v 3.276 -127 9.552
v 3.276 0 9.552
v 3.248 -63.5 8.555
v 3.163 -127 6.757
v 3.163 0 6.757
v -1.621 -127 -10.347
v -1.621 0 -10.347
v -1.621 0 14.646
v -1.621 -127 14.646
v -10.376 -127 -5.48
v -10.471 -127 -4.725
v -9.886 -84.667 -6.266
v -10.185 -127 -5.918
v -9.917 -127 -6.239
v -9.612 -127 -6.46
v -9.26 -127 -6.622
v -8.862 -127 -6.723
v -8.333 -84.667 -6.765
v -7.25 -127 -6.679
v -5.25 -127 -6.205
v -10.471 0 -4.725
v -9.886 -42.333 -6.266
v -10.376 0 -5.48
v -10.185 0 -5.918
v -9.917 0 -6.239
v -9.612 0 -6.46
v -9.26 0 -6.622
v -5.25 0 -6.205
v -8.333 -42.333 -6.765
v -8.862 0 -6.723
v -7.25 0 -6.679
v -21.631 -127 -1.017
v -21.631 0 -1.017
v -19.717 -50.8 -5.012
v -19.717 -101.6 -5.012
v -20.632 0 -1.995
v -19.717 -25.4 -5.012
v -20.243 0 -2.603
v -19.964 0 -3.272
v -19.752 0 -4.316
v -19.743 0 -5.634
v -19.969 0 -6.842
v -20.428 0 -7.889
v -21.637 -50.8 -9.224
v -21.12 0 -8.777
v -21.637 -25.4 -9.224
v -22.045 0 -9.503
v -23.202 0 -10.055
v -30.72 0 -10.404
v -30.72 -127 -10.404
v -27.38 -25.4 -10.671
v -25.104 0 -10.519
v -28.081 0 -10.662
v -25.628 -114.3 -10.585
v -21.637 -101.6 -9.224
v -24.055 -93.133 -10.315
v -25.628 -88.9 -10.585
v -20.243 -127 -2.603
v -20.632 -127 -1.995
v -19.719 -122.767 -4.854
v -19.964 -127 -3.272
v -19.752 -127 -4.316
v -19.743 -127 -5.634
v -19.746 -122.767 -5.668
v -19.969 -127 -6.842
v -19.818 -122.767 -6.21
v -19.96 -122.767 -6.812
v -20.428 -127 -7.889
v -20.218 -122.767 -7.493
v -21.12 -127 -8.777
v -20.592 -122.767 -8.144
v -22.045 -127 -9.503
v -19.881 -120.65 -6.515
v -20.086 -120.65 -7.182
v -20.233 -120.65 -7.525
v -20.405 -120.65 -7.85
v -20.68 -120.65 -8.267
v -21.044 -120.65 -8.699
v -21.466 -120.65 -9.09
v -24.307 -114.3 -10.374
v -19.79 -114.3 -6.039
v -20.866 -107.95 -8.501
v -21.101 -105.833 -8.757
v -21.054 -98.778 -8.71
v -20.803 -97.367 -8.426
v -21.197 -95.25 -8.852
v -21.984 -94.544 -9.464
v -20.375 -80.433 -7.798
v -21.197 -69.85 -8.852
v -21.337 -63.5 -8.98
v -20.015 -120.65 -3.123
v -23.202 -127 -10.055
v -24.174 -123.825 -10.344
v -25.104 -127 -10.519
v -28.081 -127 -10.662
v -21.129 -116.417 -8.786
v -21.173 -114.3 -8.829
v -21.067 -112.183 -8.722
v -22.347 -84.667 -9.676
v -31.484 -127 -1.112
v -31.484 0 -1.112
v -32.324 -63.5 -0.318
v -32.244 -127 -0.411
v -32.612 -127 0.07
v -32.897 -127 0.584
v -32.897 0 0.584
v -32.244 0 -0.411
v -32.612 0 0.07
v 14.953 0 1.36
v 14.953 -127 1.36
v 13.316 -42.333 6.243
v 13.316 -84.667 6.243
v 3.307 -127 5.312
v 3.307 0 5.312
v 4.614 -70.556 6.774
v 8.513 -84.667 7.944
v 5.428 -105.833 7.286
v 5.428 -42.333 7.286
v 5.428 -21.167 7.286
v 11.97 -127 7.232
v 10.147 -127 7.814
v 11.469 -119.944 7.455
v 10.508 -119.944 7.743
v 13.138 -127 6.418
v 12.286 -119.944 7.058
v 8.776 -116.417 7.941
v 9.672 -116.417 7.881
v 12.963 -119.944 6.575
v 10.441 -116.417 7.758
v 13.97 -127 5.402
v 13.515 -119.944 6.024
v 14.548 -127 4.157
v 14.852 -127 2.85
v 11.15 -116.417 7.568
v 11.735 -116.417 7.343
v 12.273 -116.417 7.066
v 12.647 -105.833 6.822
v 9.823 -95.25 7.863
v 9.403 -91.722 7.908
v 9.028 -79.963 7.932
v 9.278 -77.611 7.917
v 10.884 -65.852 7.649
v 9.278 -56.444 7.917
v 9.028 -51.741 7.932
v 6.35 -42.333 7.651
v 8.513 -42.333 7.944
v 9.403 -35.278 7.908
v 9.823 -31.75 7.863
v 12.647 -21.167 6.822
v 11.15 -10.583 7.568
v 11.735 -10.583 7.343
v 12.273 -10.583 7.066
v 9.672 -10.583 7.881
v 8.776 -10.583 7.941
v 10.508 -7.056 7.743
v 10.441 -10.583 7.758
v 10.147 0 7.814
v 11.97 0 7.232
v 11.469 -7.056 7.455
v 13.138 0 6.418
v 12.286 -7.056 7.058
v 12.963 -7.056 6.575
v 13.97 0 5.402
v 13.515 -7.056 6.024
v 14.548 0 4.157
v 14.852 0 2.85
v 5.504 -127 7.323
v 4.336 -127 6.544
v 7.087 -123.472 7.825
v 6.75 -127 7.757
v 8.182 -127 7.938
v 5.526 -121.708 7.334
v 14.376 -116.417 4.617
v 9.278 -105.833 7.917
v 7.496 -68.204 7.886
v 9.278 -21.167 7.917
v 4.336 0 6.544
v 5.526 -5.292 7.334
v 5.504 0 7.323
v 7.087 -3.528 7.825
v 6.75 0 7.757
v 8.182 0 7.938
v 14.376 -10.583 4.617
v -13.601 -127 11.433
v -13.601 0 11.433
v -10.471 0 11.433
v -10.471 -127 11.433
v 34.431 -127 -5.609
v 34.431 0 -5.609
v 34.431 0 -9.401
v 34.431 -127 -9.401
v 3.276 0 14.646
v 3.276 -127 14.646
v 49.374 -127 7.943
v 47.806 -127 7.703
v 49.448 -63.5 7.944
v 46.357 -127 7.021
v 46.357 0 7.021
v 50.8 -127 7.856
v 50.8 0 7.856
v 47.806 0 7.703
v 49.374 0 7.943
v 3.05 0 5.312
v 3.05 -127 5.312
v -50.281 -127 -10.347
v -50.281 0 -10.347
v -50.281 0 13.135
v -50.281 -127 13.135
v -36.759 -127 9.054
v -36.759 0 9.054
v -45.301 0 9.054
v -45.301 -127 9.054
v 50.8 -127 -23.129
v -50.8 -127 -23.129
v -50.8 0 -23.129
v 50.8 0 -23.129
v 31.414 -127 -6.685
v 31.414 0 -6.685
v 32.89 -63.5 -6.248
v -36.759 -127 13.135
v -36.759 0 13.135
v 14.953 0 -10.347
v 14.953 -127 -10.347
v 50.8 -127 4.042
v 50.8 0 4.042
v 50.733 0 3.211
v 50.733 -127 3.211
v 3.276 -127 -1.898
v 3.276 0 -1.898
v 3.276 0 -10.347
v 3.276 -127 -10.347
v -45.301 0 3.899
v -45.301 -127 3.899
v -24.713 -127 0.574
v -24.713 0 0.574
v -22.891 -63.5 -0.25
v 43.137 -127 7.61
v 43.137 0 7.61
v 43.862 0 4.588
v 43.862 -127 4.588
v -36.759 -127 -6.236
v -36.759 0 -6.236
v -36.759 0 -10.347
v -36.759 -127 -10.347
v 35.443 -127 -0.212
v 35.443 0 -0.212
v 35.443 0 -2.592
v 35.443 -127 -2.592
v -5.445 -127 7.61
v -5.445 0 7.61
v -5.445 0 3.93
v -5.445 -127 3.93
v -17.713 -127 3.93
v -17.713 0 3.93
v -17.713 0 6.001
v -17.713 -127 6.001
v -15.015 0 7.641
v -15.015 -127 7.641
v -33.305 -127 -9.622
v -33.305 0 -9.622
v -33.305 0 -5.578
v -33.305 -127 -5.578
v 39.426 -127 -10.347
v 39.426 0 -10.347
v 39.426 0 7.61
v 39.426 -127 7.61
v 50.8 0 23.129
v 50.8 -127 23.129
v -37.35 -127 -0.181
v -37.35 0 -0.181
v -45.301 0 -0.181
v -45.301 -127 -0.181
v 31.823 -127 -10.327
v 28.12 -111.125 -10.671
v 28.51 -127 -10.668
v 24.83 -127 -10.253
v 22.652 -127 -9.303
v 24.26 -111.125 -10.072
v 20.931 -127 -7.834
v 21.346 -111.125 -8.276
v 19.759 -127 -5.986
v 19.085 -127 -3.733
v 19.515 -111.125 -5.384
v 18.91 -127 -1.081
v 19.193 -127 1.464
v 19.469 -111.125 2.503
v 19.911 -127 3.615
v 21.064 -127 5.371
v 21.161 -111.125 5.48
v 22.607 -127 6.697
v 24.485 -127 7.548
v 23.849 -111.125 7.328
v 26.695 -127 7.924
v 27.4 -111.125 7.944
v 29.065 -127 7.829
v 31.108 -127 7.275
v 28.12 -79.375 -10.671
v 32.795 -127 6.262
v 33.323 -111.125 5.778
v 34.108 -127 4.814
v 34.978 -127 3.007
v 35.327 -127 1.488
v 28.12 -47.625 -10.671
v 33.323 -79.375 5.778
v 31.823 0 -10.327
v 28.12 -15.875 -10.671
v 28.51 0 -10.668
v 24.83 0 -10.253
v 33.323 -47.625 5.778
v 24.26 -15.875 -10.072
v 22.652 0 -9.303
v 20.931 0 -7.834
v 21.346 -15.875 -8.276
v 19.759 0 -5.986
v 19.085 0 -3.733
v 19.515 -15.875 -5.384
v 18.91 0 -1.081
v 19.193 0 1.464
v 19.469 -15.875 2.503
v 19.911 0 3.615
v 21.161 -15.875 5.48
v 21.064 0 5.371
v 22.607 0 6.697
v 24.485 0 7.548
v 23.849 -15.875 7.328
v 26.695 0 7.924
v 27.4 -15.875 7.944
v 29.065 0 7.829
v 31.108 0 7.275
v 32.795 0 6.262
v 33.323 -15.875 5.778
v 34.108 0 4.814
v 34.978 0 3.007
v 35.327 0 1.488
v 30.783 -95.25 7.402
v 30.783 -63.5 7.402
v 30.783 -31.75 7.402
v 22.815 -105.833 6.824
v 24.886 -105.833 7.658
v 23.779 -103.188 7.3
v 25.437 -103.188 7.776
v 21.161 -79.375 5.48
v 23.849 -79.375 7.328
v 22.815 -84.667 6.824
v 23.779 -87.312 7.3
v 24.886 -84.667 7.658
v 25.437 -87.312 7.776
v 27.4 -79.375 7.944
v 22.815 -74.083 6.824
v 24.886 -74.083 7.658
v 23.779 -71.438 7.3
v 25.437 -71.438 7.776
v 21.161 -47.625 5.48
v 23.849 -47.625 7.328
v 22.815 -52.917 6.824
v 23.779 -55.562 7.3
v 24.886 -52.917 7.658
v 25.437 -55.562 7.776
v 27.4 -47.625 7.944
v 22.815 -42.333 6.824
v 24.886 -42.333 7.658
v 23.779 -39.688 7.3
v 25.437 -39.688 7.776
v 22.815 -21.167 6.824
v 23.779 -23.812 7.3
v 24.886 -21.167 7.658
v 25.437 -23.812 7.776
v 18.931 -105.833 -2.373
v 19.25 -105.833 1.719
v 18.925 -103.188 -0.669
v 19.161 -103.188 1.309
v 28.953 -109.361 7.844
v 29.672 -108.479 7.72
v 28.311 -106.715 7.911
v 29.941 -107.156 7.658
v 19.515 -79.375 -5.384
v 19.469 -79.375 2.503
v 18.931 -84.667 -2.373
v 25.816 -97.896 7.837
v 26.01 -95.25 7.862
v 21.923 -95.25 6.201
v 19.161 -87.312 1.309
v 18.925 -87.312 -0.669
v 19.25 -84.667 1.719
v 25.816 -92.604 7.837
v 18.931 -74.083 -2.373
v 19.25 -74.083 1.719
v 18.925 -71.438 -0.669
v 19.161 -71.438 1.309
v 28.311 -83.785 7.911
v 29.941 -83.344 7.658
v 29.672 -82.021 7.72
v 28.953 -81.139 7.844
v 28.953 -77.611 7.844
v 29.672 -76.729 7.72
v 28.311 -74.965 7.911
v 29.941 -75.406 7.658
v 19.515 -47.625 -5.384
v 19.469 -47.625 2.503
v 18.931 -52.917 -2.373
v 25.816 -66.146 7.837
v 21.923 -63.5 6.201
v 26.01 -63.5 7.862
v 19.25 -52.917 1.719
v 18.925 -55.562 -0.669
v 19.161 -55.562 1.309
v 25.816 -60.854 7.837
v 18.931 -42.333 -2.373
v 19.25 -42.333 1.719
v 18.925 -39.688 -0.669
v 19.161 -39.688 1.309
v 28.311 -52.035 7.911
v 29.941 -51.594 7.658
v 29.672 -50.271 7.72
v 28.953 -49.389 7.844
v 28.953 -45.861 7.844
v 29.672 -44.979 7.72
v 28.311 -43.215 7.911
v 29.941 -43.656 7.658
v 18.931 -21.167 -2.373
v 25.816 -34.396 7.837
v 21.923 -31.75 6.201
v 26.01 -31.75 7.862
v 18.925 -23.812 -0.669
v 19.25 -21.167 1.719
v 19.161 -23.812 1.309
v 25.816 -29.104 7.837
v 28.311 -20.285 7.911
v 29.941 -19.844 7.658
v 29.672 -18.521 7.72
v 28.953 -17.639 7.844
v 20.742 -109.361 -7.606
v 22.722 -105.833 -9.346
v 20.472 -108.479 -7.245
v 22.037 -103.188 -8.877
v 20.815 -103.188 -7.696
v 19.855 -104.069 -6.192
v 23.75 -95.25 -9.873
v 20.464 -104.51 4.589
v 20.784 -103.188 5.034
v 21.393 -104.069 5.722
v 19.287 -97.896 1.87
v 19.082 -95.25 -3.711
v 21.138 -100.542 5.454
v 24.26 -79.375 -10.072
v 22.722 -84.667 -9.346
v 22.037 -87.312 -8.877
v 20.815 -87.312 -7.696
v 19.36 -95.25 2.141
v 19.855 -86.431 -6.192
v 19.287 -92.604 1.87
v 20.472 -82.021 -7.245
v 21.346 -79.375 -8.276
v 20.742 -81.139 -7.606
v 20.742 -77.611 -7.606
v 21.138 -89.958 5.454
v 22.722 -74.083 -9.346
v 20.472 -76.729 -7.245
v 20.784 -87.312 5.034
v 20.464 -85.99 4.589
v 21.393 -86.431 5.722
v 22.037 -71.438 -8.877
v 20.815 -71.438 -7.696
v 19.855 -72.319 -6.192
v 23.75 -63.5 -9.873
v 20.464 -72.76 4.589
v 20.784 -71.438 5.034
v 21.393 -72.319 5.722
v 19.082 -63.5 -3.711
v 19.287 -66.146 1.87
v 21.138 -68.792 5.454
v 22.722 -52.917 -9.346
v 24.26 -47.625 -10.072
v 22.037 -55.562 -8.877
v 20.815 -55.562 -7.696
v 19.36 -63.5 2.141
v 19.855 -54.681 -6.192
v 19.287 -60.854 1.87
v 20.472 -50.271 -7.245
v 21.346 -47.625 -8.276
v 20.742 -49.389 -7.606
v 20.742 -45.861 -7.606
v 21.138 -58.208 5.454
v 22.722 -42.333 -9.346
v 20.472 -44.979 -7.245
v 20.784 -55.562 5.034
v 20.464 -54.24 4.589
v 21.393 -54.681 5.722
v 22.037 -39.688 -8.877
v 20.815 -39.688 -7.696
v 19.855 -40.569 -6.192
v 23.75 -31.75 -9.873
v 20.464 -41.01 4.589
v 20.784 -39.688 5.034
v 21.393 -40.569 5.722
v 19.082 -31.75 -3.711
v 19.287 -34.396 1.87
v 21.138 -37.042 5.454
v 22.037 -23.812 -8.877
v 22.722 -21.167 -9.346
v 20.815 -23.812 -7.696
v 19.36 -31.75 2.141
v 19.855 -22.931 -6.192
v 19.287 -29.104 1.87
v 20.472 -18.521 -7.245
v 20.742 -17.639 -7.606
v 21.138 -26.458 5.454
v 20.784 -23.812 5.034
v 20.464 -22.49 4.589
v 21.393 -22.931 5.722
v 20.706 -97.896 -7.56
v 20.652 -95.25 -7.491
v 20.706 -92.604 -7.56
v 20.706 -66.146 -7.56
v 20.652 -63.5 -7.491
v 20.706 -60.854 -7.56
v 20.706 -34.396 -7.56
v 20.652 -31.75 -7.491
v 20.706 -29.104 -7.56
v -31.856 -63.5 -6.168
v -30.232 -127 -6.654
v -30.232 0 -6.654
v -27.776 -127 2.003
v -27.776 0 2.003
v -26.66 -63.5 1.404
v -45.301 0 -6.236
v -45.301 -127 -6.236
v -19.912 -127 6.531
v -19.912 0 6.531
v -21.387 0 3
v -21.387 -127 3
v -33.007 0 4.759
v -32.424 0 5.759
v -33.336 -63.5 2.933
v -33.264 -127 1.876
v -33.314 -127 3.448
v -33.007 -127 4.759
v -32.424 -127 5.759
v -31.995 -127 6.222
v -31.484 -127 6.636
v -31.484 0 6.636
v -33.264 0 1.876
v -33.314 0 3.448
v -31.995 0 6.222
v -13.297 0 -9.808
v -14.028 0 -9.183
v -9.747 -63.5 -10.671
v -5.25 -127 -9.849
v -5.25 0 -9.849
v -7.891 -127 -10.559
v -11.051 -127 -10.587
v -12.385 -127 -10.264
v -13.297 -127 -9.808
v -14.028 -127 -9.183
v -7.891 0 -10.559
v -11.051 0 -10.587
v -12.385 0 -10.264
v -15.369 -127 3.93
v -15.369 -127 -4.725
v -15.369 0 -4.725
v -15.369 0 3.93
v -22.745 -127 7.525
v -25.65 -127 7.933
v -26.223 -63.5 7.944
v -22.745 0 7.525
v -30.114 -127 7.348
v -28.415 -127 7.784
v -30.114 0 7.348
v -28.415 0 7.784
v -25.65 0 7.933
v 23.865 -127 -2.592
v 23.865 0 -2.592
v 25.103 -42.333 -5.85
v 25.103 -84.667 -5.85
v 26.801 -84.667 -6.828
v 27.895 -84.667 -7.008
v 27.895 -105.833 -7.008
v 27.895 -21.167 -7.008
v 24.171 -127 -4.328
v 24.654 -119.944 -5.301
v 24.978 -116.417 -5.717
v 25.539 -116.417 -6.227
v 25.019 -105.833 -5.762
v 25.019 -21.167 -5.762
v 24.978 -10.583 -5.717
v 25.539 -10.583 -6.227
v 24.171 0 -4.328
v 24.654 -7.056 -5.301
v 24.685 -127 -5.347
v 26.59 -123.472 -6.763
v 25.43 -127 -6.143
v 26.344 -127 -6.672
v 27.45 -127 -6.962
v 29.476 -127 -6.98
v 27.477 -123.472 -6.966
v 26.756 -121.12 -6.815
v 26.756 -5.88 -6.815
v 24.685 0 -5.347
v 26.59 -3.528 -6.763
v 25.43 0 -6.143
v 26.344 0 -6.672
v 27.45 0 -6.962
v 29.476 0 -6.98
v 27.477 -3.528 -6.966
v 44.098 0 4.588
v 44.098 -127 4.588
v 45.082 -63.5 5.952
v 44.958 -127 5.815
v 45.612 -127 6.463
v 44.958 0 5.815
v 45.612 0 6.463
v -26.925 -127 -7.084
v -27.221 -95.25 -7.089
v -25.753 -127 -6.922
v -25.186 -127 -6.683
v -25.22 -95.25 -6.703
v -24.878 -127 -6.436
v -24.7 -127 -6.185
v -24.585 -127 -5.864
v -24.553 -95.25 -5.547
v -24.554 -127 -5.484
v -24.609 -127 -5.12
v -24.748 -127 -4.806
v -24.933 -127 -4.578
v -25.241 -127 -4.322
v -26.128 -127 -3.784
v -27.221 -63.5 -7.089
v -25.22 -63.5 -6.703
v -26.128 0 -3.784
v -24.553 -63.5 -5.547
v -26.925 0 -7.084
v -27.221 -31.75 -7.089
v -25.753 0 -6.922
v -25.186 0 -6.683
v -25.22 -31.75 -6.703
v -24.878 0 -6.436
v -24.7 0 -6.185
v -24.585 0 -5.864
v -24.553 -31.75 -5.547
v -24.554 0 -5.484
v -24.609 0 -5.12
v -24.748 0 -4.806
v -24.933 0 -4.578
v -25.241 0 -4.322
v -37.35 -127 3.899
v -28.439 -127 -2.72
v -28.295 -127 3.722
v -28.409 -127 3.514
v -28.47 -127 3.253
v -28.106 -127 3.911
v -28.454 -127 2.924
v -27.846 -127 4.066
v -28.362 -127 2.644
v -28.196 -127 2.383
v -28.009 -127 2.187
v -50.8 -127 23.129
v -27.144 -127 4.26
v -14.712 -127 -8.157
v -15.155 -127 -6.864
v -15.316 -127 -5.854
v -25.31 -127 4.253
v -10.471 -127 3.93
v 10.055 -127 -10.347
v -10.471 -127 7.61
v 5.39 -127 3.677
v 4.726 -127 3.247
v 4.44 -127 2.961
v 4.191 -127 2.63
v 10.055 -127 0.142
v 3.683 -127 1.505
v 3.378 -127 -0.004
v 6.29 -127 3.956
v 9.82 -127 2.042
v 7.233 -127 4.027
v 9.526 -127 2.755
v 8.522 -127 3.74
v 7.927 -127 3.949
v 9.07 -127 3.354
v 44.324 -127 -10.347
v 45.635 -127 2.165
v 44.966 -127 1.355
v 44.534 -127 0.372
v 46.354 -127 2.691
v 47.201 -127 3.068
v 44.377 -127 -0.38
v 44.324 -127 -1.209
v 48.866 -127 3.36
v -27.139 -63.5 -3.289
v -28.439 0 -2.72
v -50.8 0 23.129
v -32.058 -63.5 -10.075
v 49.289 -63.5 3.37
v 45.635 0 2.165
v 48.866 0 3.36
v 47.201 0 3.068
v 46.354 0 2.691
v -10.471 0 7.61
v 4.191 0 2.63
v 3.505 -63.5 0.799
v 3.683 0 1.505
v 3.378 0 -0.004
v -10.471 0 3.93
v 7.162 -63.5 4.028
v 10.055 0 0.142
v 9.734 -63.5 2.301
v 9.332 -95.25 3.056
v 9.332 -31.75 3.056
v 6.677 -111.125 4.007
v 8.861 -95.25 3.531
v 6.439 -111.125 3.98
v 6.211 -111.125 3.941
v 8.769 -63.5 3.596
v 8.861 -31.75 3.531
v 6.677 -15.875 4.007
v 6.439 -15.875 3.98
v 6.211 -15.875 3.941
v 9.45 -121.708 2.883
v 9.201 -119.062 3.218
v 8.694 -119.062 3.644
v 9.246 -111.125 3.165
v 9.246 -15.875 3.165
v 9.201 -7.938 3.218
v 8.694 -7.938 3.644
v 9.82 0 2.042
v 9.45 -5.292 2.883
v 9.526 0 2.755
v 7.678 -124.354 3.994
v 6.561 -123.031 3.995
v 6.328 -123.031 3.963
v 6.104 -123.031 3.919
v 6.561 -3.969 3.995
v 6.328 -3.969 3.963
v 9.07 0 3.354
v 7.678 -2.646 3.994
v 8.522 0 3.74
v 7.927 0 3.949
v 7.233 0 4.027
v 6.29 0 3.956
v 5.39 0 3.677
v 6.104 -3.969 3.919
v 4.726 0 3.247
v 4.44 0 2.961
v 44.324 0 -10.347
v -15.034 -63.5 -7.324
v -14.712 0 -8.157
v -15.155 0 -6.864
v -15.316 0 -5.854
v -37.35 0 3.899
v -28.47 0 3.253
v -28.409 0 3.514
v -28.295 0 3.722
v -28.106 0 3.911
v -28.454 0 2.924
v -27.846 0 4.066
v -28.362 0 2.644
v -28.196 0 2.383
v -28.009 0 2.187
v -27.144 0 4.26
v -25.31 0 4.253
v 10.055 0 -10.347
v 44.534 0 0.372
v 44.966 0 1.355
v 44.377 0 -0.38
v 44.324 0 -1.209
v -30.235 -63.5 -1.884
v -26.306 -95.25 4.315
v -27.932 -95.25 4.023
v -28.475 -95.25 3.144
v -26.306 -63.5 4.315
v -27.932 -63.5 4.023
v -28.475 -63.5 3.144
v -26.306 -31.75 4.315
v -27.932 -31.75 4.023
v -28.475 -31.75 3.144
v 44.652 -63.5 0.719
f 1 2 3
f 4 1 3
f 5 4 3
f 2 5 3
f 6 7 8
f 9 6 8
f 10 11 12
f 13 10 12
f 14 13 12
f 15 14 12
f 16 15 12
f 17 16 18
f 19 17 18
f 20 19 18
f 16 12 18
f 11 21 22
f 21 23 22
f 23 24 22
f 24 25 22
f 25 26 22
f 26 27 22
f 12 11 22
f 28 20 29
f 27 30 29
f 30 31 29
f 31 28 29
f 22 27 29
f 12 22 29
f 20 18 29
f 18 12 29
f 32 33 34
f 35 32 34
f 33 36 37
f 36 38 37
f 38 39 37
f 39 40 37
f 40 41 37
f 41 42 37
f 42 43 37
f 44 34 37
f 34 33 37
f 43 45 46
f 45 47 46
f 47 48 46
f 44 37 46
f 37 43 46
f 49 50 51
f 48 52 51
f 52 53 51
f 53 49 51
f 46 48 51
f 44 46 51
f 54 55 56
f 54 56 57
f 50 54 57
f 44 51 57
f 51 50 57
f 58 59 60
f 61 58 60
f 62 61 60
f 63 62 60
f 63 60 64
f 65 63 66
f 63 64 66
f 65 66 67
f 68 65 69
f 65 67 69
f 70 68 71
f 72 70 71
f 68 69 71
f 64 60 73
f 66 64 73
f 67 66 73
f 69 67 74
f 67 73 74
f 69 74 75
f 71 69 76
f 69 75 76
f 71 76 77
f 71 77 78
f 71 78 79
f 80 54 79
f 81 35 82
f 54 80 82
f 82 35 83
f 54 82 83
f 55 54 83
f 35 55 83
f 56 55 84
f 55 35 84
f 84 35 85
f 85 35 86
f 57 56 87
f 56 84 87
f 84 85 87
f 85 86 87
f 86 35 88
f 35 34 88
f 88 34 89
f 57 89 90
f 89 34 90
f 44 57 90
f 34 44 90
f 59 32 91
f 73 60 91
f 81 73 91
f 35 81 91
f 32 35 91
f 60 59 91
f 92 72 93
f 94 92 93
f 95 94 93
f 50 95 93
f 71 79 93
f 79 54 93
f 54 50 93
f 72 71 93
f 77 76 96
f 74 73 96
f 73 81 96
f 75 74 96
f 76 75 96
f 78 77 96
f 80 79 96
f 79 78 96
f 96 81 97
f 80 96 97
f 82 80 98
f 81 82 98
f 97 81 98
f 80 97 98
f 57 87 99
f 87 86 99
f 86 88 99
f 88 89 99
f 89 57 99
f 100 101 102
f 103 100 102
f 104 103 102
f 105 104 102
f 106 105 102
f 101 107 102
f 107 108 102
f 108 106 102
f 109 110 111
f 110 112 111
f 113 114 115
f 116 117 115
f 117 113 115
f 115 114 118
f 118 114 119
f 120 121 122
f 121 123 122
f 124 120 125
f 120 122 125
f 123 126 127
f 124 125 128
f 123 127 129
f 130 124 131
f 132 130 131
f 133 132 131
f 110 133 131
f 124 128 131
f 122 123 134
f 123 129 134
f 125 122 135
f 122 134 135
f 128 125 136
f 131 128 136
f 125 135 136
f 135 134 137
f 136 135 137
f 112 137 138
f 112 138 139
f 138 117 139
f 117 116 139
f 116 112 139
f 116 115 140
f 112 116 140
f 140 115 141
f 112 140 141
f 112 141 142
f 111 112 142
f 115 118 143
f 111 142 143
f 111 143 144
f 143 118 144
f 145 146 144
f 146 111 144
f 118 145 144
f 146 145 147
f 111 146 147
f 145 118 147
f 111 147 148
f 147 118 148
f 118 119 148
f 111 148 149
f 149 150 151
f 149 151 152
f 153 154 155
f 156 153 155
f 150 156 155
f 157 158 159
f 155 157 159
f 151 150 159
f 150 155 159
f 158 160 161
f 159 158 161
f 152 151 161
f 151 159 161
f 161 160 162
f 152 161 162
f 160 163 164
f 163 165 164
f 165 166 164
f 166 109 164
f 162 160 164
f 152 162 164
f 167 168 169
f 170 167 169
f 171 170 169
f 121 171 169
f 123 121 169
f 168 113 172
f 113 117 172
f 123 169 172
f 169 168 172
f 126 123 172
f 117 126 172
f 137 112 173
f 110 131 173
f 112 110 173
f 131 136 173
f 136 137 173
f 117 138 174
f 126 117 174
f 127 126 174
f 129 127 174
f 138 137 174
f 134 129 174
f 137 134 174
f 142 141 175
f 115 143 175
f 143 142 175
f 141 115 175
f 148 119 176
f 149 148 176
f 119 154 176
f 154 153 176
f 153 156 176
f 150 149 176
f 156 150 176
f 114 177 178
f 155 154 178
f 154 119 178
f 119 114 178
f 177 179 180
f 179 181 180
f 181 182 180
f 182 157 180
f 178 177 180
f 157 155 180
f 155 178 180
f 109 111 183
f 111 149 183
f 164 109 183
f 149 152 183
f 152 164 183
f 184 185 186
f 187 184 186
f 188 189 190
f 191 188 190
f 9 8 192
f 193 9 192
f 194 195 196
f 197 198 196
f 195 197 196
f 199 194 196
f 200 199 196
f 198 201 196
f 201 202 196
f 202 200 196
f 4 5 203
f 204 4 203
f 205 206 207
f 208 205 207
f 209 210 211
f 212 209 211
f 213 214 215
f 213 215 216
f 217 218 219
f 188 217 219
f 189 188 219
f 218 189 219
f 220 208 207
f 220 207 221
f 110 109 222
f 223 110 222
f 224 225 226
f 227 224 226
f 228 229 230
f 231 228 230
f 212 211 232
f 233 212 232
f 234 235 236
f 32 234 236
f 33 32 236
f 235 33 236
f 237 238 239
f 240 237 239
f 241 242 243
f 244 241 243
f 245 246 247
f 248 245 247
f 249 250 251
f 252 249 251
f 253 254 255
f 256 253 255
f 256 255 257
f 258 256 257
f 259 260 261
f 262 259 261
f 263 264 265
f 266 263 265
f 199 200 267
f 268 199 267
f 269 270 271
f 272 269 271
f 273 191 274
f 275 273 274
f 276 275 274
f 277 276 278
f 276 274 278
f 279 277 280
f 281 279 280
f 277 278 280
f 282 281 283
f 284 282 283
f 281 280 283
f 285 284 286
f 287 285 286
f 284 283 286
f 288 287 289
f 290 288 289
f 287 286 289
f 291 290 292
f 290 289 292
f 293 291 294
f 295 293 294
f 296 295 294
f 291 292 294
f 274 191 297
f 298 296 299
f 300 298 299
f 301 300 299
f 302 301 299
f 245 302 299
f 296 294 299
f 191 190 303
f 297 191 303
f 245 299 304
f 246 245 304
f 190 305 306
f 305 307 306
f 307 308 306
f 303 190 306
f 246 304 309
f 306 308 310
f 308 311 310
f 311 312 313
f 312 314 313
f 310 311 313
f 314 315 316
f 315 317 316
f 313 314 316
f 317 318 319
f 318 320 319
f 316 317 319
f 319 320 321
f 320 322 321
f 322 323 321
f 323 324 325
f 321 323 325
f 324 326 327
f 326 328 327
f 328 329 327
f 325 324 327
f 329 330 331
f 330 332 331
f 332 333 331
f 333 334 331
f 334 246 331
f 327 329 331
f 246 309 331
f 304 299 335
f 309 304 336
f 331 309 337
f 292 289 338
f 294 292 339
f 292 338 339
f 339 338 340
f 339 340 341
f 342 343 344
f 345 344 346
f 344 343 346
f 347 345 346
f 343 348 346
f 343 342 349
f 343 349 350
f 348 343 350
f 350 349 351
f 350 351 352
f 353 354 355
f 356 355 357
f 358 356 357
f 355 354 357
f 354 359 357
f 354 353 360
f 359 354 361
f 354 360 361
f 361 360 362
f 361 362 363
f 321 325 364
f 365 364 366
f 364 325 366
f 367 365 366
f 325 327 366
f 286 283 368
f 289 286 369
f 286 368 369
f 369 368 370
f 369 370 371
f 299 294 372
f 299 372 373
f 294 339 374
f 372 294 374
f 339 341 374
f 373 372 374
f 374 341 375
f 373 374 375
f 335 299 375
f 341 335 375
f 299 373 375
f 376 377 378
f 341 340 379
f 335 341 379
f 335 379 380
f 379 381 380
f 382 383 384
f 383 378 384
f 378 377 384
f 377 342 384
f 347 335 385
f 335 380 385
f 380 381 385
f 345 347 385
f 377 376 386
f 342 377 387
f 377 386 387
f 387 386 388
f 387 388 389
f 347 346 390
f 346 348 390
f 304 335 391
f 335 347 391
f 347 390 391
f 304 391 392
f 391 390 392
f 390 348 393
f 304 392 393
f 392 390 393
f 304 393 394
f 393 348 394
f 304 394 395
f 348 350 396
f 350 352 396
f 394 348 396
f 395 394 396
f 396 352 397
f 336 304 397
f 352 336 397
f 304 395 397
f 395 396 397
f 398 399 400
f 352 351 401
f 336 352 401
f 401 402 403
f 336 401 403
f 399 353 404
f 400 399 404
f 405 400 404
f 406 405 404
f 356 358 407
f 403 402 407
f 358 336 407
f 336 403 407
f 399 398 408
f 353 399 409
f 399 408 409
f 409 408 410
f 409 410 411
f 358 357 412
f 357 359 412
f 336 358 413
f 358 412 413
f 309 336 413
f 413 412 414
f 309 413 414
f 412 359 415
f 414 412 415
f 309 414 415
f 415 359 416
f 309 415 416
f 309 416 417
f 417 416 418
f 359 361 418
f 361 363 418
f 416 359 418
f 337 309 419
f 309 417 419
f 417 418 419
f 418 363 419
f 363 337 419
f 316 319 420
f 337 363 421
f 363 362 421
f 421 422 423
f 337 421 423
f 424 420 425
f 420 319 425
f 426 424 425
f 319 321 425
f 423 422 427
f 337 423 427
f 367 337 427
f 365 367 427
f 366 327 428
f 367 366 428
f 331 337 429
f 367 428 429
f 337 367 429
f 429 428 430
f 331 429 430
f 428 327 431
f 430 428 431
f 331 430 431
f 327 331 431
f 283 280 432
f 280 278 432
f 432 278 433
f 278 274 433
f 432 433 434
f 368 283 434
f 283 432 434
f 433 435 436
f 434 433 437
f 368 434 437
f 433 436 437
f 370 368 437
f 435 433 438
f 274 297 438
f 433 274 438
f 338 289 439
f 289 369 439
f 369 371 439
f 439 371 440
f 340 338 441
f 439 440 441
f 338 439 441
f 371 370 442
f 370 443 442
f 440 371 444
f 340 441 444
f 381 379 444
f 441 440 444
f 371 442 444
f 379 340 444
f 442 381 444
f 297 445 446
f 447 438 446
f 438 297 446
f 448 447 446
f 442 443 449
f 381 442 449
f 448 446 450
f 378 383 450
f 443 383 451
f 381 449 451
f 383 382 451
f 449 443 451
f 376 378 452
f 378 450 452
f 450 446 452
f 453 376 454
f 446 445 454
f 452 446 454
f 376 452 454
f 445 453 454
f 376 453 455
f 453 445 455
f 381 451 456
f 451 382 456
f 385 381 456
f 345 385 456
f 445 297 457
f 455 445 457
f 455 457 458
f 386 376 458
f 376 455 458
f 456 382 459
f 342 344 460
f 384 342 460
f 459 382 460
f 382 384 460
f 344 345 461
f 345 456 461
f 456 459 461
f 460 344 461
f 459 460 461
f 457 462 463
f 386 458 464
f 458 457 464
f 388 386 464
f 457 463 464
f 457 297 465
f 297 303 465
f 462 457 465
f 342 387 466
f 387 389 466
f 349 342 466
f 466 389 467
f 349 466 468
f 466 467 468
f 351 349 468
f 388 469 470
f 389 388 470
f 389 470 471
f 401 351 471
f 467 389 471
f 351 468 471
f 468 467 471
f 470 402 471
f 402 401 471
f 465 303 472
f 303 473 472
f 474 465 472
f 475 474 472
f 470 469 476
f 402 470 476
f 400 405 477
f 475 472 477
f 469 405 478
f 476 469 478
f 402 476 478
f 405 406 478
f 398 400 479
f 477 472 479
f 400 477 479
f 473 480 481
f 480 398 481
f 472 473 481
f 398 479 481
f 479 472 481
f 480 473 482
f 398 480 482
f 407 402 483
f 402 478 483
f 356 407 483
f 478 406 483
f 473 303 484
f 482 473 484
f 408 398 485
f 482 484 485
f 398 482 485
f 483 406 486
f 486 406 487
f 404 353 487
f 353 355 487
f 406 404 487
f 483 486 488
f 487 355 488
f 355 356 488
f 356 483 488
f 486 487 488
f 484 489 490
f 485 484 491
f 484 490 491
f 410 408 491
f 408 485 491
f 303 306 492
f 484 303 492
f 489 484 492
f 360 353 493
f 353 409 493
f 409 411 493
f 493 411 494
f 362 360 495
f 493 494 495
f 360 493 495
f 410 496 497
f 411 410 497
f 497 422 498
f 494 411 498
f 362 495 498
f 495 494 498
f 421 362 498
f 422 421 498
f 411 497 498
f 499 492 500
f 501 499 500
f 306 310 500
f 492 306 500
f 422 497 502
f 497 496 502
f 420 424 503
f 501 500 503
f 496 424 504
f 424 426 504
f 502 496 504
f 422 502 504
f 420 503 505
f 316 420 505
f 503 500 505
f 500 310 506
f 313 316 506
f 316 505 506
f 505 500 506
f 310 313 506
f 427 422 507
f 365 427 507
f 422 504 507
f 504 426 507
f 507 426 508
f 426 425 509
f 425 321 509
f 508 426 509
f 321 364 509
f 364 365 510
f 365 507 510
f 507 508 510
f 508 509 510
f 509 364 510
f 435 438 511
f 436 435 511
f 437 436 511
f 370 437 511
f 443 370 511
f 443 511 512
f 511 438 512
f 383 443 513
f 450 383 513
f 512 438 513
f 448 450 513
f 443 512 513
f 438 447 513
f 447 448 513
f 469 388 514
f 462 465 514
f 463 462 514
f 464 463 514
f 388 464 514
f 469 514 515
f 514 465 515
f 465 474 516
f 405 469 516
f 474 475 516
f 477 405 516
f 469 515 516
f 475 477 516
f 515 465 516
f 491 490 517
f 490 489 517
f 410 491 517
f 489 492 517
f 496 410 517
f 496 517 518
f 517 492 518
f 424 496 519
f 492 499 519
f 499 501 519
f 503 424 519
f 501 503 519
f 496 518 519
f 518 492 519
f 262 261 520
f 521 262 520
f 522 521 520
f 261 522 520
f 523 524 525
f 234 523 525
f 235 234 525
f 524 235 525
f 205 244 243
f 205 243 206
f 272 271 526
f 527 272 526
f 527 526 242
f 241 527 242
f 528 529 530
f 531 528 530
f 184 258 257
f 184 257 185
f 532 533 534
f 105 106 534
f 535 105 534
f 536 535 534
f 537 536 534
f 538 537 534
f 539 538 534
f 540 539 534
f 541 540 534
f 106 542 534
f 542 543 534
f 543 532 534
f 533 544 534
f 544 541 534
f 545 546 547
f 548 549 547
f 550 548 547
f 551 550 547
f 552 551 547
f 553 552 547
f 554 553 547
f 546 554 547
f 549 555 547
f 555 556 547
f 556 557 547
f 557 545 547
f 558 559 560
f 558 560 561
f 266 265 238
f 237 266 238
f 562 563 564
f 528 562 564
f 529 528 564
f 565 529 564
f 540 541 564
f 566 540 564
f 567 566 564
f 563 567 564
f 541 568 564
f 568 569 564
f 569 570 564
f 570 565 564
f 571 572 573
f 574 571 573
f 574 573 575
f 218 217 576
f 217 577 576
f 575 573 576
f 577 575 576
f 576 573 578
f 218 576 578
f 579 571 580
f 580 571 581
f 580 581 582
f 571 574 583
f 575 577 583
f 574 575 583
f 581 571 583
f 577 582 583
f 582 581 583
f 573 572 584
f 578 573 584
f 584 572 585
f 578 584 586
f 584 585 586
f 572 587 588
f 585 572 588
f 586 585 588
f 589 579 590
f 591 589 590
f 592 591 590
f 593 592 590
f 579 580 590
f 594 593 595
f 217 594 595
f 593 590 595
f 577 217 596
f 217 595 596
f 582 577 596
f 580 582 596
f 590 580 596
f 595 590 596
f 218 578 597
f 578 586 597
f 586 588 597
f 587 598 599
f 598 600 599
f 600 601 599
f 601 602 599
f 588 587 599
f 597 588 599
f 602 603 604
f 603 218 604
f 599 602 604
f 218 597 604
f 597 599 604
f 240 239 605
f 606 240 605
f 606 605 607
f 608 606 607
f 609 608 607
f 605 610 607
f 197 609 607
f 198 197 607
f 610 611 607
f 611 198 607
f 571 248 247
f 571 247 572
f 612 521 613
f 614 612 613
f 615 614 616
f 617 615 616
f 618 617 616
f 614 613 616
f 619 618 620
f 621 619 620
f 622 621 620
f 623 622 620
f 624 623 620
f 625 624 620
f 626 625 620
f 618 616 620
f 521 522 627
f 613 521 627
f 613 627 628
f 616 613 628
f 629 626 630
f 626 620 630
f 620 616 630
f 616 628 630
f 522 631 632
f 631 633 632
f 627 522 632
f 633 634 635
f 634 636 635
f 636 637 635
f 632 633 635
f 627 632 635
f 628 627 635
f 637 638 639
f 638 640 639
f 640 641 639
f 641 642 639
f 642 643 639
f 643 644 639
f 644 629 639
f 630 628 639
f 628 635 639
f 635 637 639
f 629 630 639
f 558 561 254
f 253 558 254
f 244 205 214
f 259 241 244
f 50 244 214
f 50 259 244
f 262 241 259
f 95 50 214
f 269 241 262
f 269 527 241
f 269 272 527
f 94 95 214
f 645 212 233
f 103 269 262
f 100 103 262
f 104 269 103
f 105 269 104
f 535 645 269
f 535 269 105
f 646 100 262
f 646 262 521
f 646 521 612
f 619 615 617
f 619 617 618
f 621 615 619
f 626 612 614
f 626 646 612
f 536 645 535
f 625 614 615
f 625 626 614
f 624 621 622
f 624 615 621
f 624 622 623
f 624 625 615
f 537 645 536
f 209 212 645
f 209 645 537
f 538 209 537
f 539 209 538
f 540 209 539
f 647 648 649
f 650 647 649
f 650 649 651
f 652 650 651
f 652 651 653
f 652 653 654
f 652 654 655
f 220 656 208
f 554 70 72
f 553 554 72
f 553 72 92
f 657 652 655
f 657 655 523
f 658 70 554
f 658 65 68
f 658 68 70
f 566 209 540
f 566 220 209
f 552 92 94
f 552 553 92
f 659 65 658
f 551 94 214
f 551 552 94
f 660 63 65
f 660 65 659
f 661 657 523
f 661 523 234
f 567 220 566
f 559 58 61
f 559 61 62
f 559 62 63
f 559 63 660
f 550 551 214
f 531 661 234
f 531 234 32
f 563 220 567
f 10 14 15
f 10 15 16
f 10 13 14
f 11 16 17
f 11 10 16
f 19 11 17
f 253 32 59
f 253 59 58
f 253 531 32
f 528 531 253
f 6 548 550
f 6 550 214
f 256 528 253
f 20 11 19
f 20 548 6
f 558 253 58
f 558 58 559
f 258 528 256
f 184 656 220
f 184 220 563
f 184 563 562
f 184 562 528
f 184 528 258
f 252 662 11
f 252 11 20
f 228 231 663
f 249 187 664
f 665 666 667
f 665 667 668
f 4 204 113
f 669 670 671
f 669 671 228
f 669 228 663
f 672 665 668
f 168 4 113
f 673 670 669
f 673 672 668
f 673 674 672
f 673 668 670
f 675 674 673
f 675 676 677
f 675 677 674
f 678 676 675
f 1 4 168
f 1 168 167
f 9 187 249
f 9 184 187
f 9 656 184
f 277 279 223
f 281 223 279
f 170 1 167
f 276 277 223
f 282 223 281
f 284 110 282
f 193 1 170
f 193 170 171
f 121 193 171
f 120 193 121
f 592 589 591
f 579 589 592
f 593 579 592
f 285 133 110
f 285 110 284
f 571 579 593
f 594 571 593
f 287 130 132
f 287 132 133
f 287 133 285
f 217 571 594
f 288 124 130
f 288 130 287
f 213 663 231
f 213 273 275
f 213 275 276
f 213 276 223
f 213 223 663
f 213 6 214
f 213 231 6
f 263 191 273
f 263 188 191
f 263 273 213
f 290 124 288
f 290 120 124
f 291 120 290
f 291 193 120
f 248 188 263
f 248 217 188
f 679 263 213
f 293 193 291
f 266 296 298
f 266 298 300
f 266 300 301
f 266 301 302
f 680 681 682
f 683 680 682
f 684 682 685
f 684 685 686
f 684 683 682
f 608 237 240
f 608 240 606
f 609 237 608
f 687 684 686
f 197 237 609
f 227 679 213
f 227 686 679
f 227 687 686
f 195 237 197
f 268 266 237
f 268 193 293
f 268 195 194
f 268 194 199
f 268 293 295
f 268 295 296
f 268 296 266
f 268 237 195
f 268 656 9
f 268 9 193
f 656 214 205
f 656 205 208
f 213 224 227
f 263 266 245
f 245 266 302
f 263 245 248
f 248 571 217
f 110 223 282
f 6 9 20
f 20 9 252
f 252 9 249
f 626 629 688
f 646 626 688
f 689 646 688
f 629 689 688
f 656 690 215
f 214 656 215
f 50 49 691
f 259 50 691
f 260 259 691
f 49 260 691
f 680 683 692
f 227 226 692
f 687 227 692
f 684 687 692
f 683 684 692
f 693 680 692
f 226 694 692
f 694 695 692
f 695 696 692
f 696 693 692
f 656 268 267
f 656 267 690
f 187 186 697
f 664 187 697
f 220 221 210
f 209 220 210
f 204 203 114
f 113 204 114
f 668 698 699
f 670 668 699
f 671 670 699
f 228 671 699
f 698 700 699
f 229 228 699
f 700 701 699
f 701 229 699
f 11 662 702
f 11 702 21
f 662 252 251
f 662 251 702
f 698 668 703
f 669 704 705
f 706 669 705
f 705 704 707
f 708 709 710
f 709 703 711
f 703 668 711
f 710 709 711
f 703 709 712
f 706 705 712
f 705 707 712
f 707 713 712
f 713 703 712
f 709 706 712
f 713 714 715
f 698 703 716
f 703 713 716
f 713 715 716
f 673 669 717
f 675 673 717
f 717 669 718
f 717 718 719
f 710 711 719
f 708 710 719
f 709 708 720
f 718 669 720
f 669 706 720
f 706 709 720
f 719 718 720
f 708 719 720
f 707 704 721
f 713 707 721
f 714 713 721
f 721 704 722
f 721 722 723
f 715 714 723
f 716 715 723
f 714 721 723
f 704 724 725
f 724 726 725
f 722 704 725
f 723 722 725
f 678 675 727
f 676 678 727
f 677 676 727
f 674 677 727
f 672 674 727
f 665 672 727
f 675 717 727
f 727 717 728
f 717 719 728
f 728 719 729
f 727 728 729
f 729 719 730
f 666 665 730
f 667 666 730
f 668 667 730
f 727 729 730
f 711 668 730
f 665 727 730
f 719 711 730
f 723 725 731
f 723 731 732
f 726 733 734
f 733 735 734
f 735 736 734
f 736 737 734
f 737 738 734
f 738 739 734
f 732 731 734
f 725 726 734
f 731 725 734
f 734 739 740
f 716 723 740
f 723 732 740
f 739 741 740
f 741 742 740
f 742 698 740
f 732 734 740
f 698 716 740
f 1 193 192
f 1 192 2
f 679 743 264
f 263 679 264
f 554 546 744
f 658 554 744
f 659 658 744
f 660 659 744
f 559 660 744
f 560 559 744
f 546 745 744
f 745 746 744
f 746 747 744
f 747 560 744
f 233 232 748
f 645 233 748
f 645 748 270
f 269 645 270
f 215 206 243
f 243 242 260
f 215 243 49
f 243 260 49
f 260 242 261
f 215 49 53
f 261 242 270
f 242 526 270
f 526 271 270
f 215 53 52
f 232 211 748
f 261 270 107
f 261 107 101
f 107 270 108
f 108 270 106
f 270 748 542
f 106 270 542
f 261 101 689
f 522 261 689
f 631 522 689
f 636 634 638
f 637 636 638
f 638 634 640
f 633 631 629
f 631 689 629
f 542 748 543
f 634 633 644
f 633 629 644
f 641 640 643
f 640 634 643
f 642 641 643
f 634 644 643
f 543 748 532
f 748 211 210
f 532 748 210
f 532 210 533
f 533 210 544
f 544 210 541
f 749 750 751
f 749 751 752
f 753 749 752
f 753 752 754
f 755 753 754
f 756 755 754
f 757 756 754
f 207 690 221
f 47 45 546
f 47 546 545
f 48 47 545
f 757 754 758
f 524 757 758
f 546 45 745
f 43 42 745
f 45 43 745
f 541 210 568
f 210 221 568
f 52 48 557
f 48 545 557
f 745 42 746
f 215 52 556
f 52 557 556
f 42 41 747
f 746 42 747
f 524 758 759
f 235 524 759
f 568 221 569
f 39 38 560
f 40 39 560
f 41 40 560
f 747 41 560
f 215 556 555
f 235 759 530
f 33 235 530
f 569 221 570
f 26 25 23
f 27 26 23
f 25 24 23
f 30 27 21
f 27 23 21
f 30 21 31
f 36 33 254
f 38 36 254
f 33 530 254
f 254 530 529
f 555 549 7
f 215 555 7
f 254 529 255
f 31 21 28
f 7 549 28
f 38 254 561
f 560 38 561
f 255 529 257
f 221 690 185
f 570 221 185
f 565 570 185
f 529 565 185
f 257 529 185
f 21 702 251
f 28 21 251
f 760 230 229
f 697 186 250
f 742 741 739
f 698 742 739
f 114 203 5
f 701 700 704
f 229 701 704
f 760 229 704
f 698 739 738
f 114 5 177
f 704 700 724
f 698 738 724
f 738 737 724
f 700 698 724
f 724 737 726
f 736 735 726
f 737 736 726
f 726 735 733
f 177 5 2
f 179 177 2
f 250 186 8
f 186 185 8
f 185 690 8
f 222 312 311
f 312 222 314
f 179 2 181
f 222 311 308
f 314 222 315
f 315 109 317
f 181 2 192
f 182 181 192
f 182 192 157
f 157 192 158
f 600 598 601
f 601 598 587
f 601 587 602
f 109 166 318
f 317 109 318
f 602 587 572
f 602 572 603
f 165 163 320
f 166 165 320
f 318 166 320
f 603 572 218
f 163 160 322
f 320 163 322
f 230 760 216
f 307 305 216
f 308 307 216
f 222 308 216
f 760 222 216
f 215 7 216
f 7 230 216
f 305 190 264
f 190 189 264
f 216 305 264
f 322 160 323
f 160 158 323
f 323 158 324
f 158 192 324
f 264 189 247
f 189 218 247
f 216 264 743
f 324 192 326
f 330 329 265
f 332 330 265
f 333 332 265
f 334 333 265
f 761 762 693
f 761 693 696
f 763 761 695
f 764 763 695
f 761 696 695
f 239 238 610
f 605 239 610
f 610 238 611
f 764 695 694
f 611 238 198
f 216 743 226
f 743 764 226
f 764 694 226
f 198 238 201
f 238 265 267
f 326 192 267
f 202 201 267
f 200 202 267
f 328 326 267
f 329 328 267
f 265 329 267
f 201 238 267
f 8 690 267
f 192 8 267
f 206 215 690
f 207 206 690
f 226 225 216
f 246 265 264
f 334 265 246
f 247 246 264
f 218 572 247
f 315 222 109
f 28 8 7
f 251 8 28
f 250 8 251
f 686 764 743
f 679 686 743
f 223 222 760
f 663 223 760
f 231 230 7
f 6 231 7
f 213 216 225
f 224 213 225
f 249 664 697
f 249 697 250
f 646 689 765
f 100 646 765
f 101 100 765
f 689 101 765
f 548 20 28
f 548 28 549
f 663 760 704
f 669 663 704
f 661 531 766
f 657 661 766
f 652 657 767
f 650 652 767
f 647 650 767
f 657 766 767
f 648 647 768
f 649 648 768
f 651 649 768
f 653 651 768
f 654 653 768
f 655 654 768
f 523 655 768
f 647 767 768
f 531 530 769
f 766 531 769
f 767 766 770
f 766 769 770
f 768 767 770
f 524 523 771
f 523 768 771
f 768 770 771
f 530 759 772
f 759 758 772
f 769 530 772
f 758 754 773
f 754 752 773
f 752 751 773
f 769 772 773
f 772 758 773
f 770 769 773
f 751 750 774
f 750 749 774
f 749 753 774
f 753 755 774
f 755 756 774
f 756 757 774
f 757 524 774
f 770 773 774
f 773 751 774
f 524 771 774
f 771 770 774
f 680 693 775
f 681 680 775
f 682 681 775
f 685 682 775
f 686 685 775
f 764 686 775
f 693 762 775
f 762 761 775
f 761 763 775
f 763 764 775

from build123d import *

# Parameters (mm, degrees)
F1_DEPTH = 127


with BuildPart() as f1:
    # F0 (on Front) → F1 (new body)
    with BuildSketch(Plane.XZ):
        with BuildLine():
            Line((50.8, 7.8558477352), (50.8, 23.1287553906))
            Line((50.8, 23.1287553906), (-50.8, 23.1287553906))
            Line((-50.8, 23.1287553906), (-50.8, -23.1287553906))
            Line((-50.8, -23.1287553906), (50.8, -23.1287553906))
            Line((50.8, -23.1287553906), (50.8, 4.0416623693))
            Line((50.8, 4.0416623693), (50.7329860296, 3.2105029863))
            add(Edge.make_bspline(
                [(50.7329860296, 3.2105029863), (50.1368226928, 3.3698224987), (49.2888317395, 3.3698224987)],
                knots=[0, 0, 0, 1, 1, 1], degree=2))
            add(Edge.make_bspline(
                [(49.2888317395, 3.3698224987), (46.9452931051, 3.3698224987), (45.6347616319, 2.1646474773)],
                knots=[0, 0, 0, 1, 1, 1], degree=2))
            add(Edge.make_bspline(
                [(45.6347616319, 2.1646474773), (44.3242301588, 0.9594724559), (44.3242301588, -1.2093286488)],
                knots=[0, 0, 0, 1, 1, 1], degree=2))
            Line((44.3242301588, -1.2093286488), (44.3242301588, -10.3470735873))
            Line((44.3242301588, -10.3470735873), (39.4264399864, -10.3470735873))
            Line((39.4264399864, -10.3470735873), (39.4264399864, 7.6097772649))
            Line((39.4264399864, 7.6097772649), (43.1370428242, 7.6097772649))
            Line((43.1370428242, 7.6097772649), (43.8616896388, 4.5878458679))
            Line((43.8616896388, 4.5878458679), (44.0980992379, 4.5878458679))
            add(Edge.make_bspline(
                [(44.0980992379, 4.5878458679), (44.9358115129, 6.0988115664), (46.356838777, 7.0213229368)],
                knots=[0, 0, 0, 1, 1, 1], degree=2))
            add(Edge.make_bspline(
                [(46.356838777, 7.0213229368), (47.777866041, 7.9438343071), (49.448151252, 7.9438343071)],
                knots=[0, 0, 0, 1, 1, 1], degree=2))
            add(Edge.make_bspline(
                [(49.448151252, 7.9438343071), (50.2277740858, 7.9438343071), (50.8, 7.8558477352)],
                knots=[0, 0, 0, 0.7819438092, 0.7819438092, 0.7819438092], degree=2))
        make_face()
        with BuildLine():
            add(Edge.make_bspline(
                [(-20.1847543566, -2.7177246777), (-19.7170744975, -3.6813507609), (-19.7170744975, -5.0124395905)],
                knots=[0, 0, 0, 1, 1, 1], degree=2))
            add(Edge.make_bspline(
                [(-19.7170744975, -5.0124395905), (-19.7170744975, -7.777404032), (-21.6366176553, -9.2241279916)],
                knots=[0, 0, 0, 1, 1, 1], degree=2))
            add(Edge.make_bspline(
                [(-21.6366176553, -9.2241279916), (-23.5561608131, -10.6708519512), (-27.3798291113, -10.6708519512)],
                knots=[0, 0, 0, 1, 1, 1], degree=2))
            add(Edge.make_bspline(
                [(-27.3798291113, -10.6708519512), (-29.3379173125, -10.6708519512), (-30.7203995332, -10.4036063175)],
                knots=[0, 0, 0, 1, 1, 1], degree=2))
            add(Edge.make_bspline(
                [(-30.7203995332, -10.4036063175), (-32.1028817539, -10.1363606837), (-33.3054871058, -9.6224267727)],
                knots=[0, 0, 0, 1, 1, 1], degree=2))
            Line((-33.3054871058, -9.6224267727), (-33.3054871058, -5.5777668927))
            add(Edge.make_bspline(
                [(-33.3054871058, -5.5777668927), (-31.9435622415, -6.2201842815), (-30.2321623177, -6.6544584364)],
                knots=[0, 0, 0, 1, 1, 1], degree=2))
            add(Edge.make_bspline(
                [(-30.2321623177, -6.6544584364), (-28.5207623939, -7.0887325912), (-27.2205095989, -7.0887325912)],
                knots=[0, 0, 0, 1, 1, 1], degree=2))
            add(Edge.make_bspline(
                [(-27.2205095989, -7.0887325912), (-24.5531926006, -7.0887325912), (-24.5531926006, -5.546930858)],
                knots=[0, 0, 0, 1, 1, 1], degree=2))
            add(Edge.make_bspline(
                [(-24.5531926006, -5.546930858), (-24.5531926006, -4.9661855386), (-24.9078069992, -4.6038621313)],
                knots=[0, 0, 0, 1, 1, 1], degree=2))
            add(Edge.make_bspline(
                [(-24.9078069992, -4.6038621313), (-25.2624213978, -4.241538724), (-26.1284000379, -3.7841375431)],
                knots=[0, 0, 0, 1, 1, 1], degree=2))
            add(Edge.make_bspline(
                [(-26.1284000379, -3.7841375431), (-26.9943786781, -3.3267363623), (-28.4385329681, -2.7202943473)],
                knots=[0, 0, 0, 1, 1, 1], degree=2))
            add(Edge.make_bspline(
                [(-28.4385329681, -2.7202943473), (-30.5096866297, -1.8517460376), (-31.4835913911, -1.1116812057)],
                knots=[0, 0, 0, 1, 1, 1], degree=2))
            add(Edge.make_bspline(
                [(-31.4835913911, -1.1116812057), (-32.4574961525, -0.3716163737), (-32.8969096465, 0.5843007008)],
                knots=[0, 0, 0, 1, 1, 1], degree=2))
            add(Edge.make_bspline(
                [(-32.8969096465, 0.5843007008), (-33.3363231404, 1.5402177754), (-33.3363231404, 2.9329786743)],
                knots=[0, 0, 0, 1, 1, 1], degree=2))
            add(Edge.make_bspline(
                [(-33.3363231404, 2.9329786743), (-33.3363231404, 5.3279106998), (-31.4835913911, 6.6358725035)],
                knots=[0, 0, 0, 1, 1, 1], degree=2))
            add(Edge.make_bspline(
                [(-31.4835913911, 6.6358725035), (-29.6308596418, 7.9438343071), (-26.2234778115, 7.9438343071)],
                knots=[0, 0, 0, 1, 1, 1], degree=2))
            add(Edge.make_bspline(
                [(-26.2234778115, 7.9438343071), (-22.9805548327, 7.9438343071), (-19.9123693837, 6.5305160517)],
                knots=[0, 0, 0, 1, 1, 1], degree=2))
            Line((-19.9123693837, 6.5305160517), (-21.3873597085, 2.9997900828))
            add(Edge.make_bspline(
                [(-21.3873597085, 2.9997900828), (-22.7390058945, 3.5753960631), (-23.9107752117, 3.9454284791)],
                knots=[0, 0, 0, 1, 1, 1], degree=2))
            add(Edge.make_bspline(
                [(-23.9107752117, 3.9454284791), (-25.0825445289, 4.3154608951), (-26.3057072372, 4.3154608951)],
                knots=[0, 0, 0, 1, 1, 1], degree=2))
            add(Edge.make_bspline(
                [(-26.3057072372, 4.3154608951), (-28.4745083419, 4.3154608951), (-28.4745083419, 3.1436915779)],
                knots=[0, 0, 0, 1, 1, 1], degree=2))
            add(Edge.make_bspline(
                [(-28.4745083419, 3.1436915779), (-28.4745083419, 2.4858561717), (-27.7755582229, 2.0027582953)],
                knots=[0, 0, 0, 1, 1, 1], degree=2))
            add(Edge.make_bspline(
                [(-27.7755582229, 2.0027582953), (-27.0766081038, 1.5196604189), (-24.712512113, 0.5740220226)],
                knots=[0, 0, 0, 1, 1, 1], degree=2))
            add(Edge.make_bspline(
                [(-24.712512113, 0.5740220226), (-22.6105224168, -0.2791082698), (-21.6314783162, -1.0166034321)],
                knots=[0, 0, 0, 1, 1, 1], degree=2))
            add(Edge.make_bspline(
                [(-21.6314783162, -1.0166034321), (-20.6524342157, -1.7540985945), (-20.1847543566, -2.7177246777)],
                knots=[0, 0, 0, 1, 1, 1], degree=2))
        make_face(mode=Mode.SUBTRACT)
        with BuildLine():
            add(Edge.make_bspline(
                [(31.686595286, -10.3573522655), (30.2270229786, -10.6708519512), (28.1198939433, -10.6708519512)],
                knots=[0, 0, 0, 1, 1, 1], degree=2))
            add(Edge.make_bspline(
                [(28.1198939433, -10.6708519512), (23.7874310731, -10.6708519512), (21.3462449956, -8.2759199257)],
                knots=[0, 0, 0, 1, 1, 1], degree=2))
            add(Edge.make_bspline(
                [(21.3462449956, -8.2759199257), (18.9050589181, -5.8809879002), (18.9050589181, -1.4971316389)],
                knots=[0, 0, 0, 1, 1, 1], degree=2))
            add(Edge.make_bspline(
                [(18.9050589181, -1.4971316389), (18.9050589181, 3.0152081001), (21.1612287876, 5.4795212036)],
                knots=[0, 0, 0, 1, 1, 1], degree=2))
            add(Edge.make_bspline(
                [(21.1612287876, 5.4795212036), (23.4173986571, 7.9438343071), (27.4003864678, 7.9438343071)],
                knots=[0, 0, 0, 1, 1, 1], degree=2))
            add(Edge.make_bspline(
                [(27.4003864678, 7.9438343071), (31.2034974096, 7.9438343071), (33.3234747927, 5.777602872)],
                knots=[0, 0, 0, 1, 1, 1], degree=2))
            add(Edge.make_bspline(
                [(33.3234747927, 5.777602872), (35.4434521758, 3.6113714369), (35.4434521758, -0.2122968613)],
                knots=[0, 0, 0, 1, 1, 1], degree=2))
            Line((35.4434521758, -0.2122968613), (35.4434521758, -2.5918108695))
            Line((35.4434521758, -2.5918108695), (23.8645211597, -2.5918108695))
            add(Edge.make_bspline(
                [(23.8645211597, -2.5918108695), (23.9467505855, -4.6783825484), (25.1031018854, -5.8501518656)],
                knots=[0, 0, 0, 1, 1, 1], degree=2))
            add(Edge.make_bspline(
                [(25.1031018854, -5.8501518656), (26.2594531853, -7.0219211828), (28.3460248641, -7.0219211828)],
                knots=[0, 0, 0, 1, 1, 1], degree=2))
            add(Edge.make_bspline(
                [(28.3460248641, -7.0219211828), (29.9700560231, -7.0219211828), (31.4142103131, -6.685294471)],
                knots=[0, 0, 0, 1, 1, 1], degree=2))
            add(Edge.make_bspline(
                [(31.4142103131, -6.685294471), (32.8583646032, -6.3486677593), (34.431002371, -5.6086029274)],
                knots=[0, 0, 0, 1, 1, 1], degree=2))
            Line((34.431002371, -5.6086029274), (34.431002371, -9.4014351909))
            add(Edge.make_bspline(
                [(34.431002371, -9.4014351909), (33.1461675934, -10.0438525798), (31.686595286, -10.3573522655)],
                knots=[0, 0, 0, 1, 1, 1], degree=2))
        make_face(mode=Mode.SUBTRACT)
        Polygon((-36.7591229881, -6.2356022989), (-36.7591229881, -10.3470735873), (-50.2807241879, -10.3470735873), (-50.2807241879, 13.1345668087), (-36.7591229881, 13.1345668087), (-36.7591229881, 9.053931555), (-45.3007045898, 9.053931555), (-45.3007045898, 3.8991744271), (-37.3501469858, 3.8991744271), (-37.3501469858, -0.1814608267), (-45.3007045898, -0.1814608267), (-45.3007045898, -6.2356022989), align=None, mode=Mode.SUBTRACT)
        with BuildLine():
            add(Edge.make_bspline(
                [(-9.8855187791, -6.2664383335), (-9.2996341205, -6.7649542272), (-8.3334383677, -6.7649542272)],
                knots=[0, 0, 0, 1, 1, 1], degree=2))
            add(Edge.make_bspline(
                [(-8.3334383677, -6.7649542272), (-7.0486035901, -6.7649542272), (-5.2498349014, -6.2047662642)],
                knots=[0, 0, 0, 1, 1, 1], degree=2))
            Line((-5.2498349014, -6.2047662642), (-5.2498349014, -9.8485576936))
            add(Edge.make_bspline(
                [(-5.2498349014, -9.8485576936), (-7.0794396248, -10.6708519512), (-9.7467566231, -10.6708519512)],
                knots=[0, 0, 0, 1, 1, 1], degree=2))
            add(Edge.make_bspline(
                [(-9.7467566231, -10.6708519512), (-12.6864585943, -10.6708519512), (-14.0278261022, -9.1830132787)],
                knots=[0, 0, 0, 1, 1, 1], degree=2))
            add(Edge.make_bspline(
                [(-14.0278261022, -9.1830132787), (-15.36919361, -7.6951746062), (-15.36919361, -4.7246366004)],
                knots=[0, 0, 0, 1, 1, 1], degree=2))
            Line((-15.36919361, -4.7246366004), (-15.36919361, 3.9300104618))
            Line((-15.36919361, 3.9300104618), (-17.7127322444, 3.9300104618))
            Line((-17.7127322444, 3.9300104618), (-17.7127322444, 6.0011641233))
            Line((-17.7127322444, 6.0011641233), (-15.0145792114, 7.6406132996))
            Line((-15.0145792114, 7.6406132996), (-13.601260956, 11.4334455631))
            Line((-13.601260956, 11.4334455631), (-10.4714034377, 11.4334455631))
            Line((-10.4714034377, 11.4334455631), (-10.4714034377, 7.6097772649))
            Line((-10.4714034377, 7.6097772649), (-5.4451297876, 7.6097772649))
            Line((-5.4451297876, 7.6097772649), (-5.4451297876, 3.9300104618))
            Line((-5.4451297876, 3.9300104618), (-10.4714034377, 3.9300104618))
            Line((-10.4714034377, 3.9300104618), (-10.4714034377, -4.7246366004))
            add(Edge.make_bspline(
                [(-10.4714034377, -4.7246366004), (-10.4714034377, -5.7679224398), (-9.8855187791, -6.2664383335)],
                knots=[0, 0, 0, 1, 1, 1], degree=2))
        make_face(mode=Mode.SUBTRACT)
        with BuildLine():
            Line((14.9529071421, 1.3603409065), (14.9529071421, -10.3470735873))
            Line((14.9529071421, -10.3470735873), (10.0551169698, -10.3470735873))
            Line((10.0551169698, -10.3470735873), (10.0551169698, 0.1423175373))
            add(Edge.make_bspline(
                [(10.0551169698, 0.1423175373), (10.0551169698, 4.0276579049), (7.1616690505, 4.0276579049)],
                knots=[0, 0, 0, 1, 1, 1], degree=2))
            add(Edge.make_bspline(
                [(7.1616690505, 4.0276579049), (5.1059334063, 4.0276579049), (4.1911310446, 2.6297576668)],
                knots=[0, 0, 0, 1, 1, 1], degree=2))
            add(Edge.make_bspline(
                [(4.1911310446, 2.6297576668), (3.276328683, 1.2318574287), (3.276328683, -1.8980000896)],
                knots=[0, 0, 0, 1, 1, 1], degree=2))
            Line((3.276328683, -1.8980000896), (3.276328683, -10.3470735873))
            Line((3.276328683, -10.3470735873), (-1.6214614894, -10.3470735873))
            Line((-1.6214614894, -10.3470735873), (-1.6214614894, 14.6455325072))
            Line((-1.6214614894, 14.6455325072), (3.276328683, 14.6455325072))
            Line((3.276328683, 14.6455325072), (3.276328683, 9.5524474487))
            add(Edge.make_bspline(
                [(3.276328683, 9.5524474487), (3.276328683, 8.9562841119), (3.1632632225, 6.7566469726)],
                knots=[0, 0, 0, 1, 1, 1], degree=2))
            Line((3.1632632225, 6.7566469726), (3.0501977621, 5.3124926825))
            Line((3.0501977621, 5.3124926825), (3.3071647176, 5.3124926825))
            add(Edge.make_bspline(
                [(3.3071647176, 5.3124926825), (4.9466138939, 7.9438343071), (8.5133152366, 7.9438343071)],
                knots=[0, 0, 0, 1, 1, 1], degree=2))
            add(Edge.make_bspline(
                [(8.5133152366, 7.9438343071), (11.6791481287, 7.9438343071), (13.3160276354, 6.2427130615)],
                knots=[0, 0, 0, 1, 1, 1], degree=2))
            add(Edge.make_bspline(
                [(13.3160276354, 6.2427130615), (14.9529071421, 4.5415918159), (14.9529071421, 1.3603409065)],
                knots=[0, 0, 0, 1, 1, 1], degree=2))
        make_face(mode=Mode.SUBTRACT)
    extrude(amount=F1_DEPTH)


solid = f1.part
